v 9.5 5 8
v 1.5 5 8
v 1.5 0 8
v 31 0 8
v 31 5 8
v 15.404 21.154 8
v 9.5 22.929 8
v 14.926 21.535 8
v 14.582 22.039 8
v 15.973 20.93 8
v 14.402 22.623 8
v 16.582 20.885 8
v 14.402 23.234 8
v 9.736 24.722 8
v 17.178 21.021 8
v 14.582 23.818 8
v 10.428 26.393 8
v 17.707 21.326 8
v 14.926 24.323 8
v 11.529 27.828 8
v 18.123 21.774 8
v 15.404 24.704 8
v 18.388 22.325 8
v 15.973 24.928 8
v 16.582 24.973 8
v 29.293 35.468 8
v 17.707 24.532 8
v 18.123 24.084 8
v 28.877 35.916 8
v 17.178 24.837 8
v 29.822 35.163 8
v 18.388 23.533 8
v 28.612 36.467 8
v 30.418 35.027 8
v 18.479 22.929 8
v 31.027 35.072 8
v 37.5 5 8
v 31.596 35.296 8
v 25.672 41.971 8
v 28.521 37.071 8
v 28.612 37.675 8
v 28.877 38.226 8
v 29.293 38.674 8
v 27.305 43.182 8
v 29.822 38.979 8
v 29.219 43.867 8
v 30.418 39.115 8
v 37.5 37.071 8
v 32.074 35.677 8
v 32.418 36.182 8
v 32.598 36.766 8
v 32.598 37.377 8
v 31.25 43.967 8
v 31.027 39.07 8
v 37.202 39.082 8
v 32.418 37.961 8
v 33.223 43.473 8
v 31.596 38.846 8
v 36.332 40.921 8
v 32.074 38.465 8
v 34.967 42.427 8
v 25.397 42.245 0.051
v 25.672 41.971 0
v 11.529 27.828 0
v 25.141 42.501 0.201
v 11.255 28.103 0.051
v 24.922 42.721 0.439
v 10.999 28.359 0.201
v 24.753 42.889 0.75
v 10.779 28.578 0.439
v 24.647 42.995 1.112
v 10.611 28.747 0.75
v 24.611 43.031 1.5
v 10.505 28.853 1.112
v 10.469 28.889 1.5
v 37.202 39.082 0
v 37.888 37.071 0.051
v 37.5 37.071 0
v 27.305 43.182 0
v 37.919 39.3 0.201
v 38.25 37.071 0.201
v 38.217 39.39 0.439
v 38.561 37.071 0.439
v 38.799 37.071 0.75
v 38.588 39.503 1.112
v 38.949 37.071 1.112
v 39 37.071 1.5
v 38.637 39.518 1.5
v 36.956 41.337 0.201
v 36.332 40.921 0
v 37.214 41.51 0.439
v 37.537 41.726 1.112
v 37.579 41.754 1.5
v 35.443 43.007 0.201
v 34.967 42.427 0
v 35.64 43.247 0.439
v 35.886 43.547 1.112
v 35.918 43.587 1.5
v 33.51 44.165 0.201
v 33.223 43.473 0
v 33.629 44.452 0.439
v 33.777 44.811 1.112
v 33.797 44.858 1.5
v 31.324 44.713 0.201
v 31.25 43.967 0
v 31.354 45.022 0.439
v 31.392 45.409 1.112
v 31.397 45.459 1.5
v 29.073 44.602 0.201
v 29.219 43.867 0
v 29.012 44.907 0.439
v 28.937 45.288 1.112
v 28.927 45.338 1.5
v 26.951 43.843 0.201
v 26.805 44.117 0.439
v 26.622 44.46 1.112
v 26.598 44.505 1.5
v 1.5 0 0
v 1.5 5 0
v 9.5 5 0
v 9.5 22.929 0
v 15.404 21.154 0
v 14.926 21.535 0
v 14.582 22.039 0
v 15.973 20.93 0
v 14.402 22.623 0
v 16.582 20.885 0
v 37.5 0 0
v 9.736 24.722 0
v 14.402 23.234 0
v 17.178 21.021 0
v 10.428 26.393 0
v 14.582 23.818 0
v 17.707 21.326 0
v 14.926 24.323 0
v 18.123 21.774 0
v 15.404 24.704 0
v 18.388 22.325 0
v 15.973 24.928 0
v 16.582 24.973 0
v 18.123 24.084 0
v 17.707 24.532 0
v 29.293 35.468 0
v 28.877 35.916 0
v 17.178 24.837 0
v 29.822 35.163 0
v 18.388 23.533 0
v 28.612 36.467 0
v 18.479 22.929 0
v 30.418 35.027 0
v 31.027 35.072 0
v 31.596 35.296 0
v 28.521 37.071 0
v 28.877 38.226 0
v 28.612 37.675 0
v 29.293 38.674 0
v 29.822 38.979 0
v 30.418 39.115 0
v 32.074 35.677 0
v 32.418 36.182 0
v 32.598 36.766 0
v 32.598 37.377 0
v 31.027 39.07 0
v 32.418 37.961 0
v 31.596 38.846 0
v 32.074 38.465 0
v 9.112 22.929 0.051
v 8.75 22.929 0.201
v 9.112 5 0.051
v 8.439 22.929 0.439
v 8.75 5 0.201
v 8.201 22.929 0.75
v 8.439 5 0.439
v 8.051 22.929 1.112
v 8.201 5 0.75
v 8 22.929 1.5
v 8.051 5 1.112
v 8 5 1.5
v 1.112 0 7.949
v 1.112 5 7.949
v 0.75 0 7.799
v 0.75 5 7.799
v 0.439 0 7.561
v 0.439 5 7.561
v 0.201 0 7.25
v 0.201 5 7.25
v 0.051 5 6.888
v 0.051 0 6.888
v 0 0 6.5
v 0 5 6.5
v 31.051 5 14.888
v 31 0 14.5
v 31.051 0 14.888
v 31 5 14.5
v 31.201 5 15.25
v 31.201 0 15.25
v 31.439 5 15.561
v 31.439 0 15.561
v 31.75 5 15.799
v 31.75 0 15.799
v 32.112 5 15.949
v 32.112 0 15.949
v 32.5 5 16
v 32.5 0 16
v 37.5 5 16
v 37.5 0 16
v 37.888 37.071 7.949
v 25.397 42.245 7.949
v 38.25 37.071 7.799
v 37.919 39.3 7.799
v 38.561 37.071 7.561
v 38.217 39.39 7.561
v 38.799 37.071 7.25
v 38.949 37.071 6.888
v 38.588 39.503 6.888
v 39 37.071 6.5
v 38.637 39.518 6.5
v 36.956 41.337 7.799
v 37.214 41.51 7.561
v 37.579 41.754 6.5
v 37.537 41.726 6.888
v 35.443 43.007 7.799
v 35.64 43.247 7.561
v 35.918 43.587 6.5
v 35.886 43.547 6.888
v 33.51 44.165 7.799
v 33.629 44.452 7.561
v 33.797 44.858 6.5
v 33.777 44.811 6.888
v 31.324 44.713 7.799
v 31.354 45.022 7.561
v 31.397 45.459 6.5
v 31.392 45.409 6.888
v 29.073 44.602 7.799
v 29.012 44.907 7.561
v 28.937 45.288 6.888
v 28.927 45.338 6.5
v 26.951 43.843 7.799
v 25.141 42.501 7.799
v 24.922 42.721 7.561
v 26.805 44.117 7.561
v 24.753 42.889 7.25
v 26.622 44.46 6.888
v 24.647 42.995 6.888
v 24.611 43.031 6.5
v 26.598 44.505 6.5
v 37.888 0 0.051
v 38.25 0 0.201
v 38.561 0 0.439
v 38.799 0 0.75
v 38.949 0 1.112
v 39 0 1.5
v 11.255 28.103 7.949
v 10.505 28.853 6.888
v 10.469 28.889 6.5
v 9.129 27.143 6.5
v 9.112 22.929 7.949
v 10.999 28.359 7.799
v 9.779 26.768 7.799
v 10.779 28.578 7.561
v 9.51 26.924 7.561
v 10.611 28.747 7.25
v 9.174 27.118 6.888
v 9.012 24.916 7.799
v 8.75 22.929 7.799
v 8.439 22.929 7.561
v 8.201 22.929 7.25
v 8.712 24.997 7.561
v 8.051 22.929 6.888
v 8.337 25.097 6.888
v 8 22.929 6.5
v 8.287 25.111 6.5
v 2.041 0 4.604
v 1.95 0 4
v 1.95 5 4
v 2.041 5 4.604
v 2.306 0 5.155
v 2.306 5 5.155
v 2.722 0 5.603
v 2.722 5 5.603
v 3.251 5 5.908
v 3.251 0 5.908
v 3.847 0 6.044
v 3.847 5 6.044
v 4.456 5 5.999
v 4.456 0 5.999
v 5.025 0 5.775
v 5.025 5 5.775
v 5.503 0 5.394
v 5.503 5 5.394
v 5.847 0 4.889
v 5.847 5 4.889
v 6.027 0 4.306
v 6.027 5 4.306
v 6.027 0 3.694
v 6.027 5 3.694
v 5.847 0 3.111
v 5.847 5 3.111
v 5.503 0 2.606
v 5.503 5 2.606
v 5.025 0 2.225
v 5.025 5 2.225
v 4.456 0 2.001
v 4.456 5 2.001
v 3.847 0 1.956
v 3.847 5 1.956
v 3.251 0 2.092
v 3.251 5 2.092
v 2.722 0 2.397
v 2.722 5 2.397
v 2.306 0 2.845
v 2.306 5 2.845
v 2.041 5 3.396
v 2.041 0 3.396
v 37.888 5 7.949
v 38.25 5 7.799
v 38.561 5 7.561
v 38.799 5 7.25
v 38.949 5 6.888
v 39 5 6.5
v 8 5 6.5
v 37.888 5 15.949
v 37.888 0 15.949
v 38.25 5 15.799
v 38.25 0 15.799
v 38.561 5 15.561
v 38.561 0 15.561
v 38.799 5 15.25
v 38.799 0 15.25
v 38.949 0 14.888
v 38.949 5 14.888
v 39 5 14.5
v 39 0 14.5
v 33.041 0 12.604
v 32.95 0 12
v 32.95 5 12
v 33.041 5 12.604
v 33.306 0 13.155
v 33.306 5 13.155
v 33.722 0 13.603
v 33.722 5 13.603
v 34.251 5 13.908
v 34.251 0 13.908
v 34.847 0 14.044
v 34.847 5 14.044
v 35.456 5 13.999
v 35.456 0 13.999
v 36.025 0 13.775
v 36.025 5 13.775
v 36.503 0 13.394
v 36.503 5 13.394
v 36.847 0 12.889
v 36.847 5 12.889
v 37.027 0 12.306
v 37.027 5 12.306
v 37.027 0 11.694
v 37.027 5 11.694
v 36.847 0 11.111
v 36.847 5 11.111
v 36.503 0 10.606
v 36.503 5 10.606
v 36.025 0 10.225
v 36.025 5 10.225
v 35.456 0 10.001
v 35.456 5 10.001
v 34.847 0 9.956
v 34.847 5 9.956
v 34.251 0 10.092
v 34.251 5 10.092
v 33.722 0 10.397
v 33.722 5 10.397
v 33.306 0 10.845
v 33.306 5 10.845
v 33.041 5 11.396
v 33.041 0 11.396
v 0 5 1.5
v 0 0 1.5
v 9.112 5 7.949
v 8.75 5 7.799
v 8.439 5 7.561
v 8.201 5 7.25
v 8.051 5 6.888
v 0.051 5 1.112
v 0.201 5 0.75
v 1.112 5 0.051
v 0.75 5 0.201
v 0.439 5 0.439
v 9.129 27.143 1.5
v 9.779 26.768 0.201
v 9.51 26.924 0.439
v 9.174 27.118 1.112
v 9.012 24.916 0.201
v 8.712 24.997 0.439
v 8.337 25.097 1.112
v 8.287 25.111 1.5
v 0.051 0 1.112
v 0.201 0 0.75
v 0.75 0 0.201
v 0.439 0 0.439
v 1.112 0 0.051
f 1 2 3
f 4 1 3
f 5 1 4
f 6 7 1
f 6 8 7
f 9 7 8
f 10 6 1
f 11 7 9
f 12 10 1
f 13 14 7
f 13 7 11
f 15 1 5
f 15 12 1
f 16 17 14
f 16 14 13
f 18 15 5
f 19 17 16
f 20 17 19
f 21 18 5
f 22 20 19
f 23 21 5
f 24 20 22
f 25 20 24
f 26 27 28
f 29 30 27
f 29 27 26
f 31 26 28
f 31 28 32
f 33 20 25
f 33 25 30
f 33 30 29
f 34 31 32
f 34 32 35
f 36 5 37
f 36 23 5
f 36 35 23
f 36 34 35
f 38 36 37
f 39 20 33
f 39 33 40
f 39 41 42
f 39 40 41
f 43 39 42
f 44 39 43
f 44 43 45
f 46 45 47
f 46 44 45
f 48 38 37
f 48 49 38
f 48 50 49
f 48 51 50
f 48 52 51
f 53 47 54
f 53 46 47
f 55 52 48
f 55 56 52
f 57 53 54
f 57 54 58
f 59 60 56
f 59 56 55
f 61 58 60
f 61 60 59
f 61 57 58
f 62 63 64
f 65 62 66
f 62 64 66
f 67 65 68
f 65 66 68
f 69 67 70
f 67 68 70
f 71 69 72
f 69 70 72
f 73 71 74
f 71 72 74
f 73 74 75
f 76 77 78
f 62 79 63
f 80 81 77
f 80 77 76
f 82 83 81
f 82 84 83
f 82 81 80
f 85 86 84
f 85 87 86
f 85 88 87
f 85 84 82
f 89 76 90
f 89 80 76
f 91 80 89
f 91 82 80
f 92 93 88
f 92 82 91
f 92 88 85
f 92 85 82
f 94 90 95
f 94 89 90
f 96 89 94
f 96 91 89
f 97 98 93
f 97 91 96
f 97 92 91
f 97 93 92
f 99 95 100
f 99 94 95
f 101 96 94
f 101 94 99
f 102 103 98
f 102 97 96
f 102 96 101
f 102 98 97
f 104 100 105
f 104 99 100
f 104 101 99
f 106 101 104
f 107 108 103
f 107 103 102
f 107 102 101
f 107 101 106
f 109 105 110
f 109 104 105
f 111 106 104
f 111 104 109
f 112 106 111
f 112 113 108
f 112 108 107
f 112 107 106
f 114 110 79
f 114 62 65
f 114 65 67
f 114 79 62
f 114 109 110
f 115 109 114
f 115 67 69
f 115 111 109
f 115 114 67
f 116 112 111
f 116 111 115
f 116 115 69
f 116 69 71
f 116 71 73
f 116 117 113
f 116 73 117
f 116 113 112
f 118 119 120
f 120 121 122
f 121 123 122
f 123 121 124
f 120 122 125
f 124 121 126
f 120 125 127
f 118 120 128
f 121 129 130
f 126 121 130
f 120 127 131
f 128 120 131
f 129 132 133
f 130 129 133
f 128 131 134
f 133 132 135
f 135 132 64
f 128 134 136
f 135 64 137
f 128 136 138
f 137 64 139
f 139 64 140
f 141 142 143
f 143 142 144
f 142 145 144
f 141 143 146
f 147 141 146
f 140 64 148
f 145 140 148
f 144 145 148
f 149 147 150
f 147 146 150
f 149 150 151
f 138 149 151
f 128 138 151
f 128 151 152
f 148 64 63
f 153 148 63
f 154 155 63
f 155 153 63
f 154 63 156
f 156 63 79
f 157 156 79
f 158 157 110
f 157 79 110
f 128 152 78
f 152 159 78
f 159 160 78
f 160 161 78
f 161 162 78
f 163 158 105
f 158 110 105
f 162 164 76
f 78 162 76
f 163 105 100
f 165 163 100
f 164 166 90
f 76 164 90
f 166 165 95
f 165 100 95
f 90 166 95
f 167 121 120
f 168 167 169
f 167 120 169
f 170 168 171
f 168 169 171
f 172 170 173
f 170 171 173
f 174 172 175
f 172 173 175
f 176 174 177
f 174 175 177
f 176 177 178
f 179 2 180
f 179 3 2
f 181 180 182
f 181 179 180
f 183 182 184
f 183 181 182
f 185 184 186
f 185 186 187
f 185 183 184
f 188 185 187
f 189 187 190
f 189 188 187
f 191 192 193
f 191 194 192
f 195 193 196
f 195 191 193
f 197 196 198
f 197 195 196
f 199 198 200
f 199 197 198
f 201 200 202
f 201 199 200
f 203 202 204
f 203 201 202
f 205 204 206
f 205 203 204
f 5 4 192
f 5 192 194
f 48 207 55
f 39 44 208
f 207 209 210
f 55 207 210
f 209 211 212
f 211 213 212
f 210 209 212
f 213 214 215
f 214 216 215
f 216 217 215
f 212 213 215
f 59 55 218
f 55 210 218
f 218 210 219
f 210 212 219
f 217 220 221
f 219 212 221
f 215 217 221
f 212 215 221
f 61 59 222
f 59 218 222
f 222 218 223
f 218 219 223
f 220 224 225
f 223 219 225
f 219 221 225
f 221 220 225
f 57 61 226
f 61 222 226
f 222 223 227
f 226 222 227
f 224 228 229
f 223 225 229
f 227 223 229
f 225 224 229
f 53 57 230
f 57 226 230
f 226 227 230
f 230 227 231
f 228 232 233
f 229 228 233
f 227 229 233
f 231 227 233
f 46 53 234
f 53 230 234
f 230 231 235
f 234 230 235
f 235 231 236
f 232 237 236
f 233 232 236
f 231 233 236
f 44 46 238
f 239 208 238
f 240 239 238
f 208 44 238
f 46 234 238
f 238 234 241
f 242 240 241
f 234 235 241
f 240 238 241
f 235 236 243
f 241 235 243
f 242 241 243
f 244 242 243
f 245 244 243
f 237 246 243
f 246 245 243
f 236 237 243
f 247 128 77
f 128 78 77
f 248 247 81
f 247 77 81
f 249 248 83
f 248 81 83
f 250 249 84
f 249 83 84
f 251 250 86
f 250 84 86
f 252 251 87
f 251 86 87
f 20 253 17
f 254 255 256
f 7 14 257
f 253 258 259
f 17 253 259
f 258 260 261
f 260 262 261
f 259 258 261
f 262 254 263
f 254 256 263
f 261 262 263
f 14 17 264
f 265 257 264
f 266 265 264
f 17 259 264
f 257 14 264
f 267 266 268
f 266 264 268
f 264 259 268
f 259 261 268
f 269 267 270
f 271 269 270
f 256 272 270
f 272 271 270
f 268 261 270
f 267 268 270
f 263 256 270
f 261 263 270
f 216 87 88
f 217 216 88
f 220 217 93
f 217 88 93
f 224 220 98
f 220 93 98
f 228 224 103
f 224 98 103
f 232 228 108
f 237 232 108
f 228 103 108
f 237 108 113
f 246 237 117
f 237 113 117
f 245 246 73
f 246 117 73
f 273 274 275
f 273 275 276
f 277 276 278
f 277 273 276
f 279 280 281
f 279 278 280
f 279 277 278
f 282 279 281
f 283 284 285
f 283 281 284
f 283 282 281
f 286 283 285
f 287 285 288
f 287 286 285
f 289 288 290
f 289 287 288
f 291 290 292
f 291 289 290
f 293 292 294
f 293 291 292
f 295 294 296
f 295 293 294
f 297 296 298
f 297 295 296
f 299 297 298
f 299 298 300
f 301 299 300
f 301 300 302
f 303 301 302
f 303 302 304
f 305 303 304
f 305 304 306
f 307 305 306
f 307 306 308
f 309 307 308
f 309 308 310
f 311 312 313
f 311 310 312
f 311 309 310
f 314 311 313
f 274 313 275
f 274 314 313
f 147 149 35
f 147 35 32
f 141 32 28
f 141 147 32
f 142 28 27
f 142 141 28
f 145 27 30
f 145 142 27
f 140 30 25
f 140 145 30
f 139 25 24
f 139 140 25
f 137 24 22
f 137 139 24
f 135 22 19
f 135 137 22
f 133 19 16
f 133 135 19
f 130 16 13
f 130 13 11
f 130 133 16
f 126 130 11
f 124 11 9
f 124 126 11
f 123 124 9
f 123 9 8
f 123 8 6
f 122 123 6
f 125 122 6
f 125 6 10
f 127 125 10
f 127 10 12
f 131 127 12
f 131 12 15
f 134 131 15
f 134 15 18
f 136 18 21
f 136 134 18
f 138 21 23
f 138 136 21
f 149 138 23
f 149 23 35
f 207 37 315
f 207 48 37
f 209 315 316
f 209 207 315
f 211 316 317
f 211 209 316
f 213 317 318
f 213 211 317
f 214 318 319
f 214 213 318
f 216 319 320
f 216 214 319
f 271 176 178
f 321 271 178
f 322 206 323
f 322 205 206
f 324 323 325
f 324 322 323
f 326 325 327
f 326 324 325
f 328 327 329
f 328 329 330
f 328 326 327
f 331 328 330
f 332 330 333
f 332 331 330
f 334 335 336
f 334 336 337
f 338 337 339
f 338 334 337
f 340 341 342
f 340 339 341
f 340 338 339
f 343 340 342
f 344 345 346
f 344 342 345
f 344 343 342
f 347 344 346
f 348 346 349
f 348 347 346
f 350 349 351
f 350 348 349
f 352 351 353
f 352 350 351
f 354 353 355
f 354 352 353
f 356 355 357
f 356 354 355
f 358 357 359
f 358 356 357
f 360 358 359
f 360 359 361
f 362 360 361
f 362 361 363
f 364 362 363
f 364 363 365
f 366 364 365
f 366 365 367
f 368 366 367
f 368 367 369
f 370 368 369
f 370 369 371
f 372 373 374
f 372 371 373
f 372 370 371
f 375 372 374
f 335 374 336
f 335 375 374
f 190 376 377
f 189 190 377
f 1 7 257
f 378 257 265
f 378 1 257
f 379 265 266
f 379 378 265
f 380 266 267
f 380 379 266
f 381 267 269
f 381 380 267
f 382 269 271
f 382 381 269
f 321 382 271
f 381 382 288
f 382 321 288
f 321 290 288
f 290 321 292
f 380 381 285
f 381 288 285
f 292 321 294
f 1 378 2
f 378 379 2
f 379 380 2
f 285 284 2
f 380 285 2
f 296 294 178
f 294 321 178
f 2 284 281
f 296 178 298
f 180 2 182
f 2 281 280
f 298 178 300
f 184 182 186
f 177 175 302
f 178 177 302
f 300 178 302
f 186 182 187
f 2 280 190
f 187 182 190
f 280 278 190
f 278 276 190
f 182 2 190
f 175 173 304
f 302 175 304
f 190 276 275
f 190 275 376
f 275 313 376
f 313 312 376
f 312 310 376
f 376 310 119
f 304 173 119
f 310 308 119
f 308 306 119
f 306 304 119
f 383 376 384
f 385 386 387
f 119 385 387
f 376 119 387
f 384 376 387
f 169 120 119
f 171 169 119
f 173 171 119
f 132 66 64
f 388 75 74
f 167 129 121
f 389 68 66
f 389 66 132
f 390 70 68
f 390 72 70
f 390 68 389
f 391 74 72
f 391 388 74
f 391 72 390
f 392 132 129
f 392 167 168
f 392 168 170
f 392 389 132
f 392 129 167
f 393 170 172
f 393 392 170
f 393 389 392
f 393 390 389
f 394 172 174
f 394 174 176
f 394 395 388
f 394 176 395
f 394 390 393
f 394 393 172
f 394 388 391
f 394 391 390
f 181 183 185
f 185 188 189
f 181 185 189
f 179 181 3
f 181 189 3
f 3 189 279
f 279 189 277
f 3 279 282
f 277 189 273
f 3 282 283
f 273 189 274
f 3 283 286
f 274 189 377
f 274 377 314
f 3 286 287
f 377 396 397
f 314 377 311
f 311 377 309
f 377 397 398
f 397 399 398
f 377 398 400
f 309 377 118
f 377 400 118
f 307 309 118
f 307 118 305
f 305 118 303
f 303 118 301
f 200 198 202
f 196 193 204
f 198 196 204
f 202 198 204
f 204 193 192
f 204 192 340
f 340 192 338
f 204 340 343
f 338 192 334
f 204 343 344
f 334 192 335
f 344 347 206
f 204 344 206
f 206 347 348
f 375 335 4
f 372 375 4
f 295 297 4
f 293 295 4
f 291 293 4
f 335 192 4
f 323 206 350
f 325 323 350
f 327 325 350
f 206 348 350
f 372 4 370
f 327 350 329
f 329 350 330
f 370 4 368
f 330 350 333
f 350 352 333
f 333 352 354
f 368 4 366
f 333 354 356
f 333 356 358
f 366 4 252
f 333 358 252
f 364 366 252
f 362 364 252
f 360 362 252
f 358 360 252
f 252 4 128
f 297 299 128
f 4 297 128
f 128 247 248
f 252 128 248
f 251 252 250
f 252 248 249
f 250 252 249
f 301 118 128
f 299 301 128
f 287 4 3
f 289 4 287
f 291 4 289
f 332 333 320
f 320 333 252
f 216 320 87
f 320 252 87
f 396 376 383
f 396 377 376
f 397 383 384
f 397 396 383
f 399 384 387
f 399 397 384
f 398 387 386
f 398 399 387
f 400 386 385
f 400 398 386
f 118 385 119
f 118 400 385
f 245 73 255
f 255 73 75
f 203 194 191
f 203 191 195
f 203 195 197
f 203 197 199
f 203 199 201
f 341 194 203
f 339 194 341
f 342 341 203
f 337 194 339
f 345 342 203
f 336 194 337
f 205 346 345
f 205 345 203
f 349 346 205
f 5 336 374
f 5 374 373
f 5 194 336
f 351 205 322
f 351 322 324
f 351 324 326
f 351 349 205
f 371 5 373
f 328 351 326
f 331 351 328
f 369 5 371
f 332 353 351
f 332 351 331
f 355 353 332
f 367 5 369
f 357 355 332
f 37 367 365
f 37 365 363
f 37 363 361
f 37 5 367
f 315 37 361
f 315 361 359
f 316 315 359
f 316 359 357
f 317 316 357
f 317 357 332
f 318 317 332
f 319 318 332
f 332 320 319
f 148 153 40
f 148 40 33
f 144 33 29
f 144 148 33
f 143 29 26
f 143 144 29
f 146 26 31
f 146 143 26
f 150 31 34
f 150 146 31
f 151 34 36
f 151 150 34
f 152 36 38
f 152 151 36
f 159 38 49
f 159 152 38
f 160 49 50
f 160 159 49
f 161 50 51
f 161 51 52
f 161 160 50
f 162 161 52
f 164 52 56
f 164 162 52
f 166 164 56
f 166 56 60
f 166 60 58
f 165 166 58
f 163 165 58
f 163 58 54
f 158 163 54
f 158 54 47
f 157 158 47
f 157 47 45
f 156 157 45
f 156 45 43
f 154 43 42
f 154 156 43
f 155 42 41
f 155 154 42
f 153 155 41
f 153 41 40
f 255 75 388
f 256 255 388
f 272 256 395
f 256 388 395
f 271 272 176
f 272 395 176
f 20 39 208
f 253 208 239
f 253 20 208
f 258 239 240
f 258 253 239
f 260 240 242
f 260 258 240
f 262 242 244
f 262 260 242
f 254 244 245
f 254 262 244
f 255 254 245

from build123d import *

# Parameters (mm, degrees)
ESQUISSE7_R                  = 2.05
BOSS_EXTRU_1_DEPTH           = 8
ESQUISSE8_W                  = 8
ESQUISSE8_H                  = 5
BOSS_EXTRU_2_DEPTH           = 8
ENL_V_MAT_EXTRU_3_DEPTH      = 59.457249337
ENL_V_MAT_EXTRU_3_DEPTH_BACK = 59.457249337
ESQUISSE9_R                  = 2.05
CONG_5_R                     = 1.5


with BuildPart() as part:
    # Esquisse7 → Boss.-Extru.1 (new body)
    with BuildSketch(Plane.XY):
        with BuildLine():
            Line((0, 0), (39, 0))
            Line((39, 0), (39, 37.071067812))
            ThreePointArc((39, 37.071067812), (33.796680513, 44.858385741), (24.610912703, 43.03122292))
            Line((24.610912703, 43.03122292), (10.46877708, 28.889087297))
            ThreePointArc((10.46877708, 28.889087297), (8.641614259, 26.154544889), (8, 22.928932188))
            Line((8, 22.928932188), (8, 5))
            Line((8, 5), (0, 5))
            Line((0, 5), (0, 0))
        make_face()
        with Locations((16.428932188, 22.928932188)):
            Circle(ESQUISSE7_R, mode=Mode.SUBTRACT)
        with Locations(Location((30.571067812, 37.071067812, 0), (0, 0, 180))):
            Circle(ESQUISSE7_R, mode=Mode.SUBTRACT)
    extrude(amount=BOSS_EXTRU_1_DEPTH)

    # Esquisse8 → Boss.-Extru.2 (add)
    with BuildSketch(Plane.XY.offset(8)):
        with Locations((35, 2.5)):
            Rectangle(ESQUISSE8_W, ESQUISSE8_H)
    extrude(amount=BOSS_EXTRU_2_DEPTH)

    # Esquisse9 → Enlèv. mat.-Extru.3 (cut, two sides: drawn at the far end of the back side and taken through both)
    with BuildSketch(Plane(origin=(0, 5, 0), x_dir=(1, 0, 0), z_dir=(0, 1, 0)).offset(-ENL_V_MAT_EXTRU_3_DEPTH_BACK)):
        with Locations(Location((35, -12, 0), (0, 0, 180))):
            Circle(ESQUISSE9_R)
        with Locations(Location((4, -4, 0), (0, 0, 180))):
            Circle(ESQUISSE9_R)
    extrude(amount=ENL_V_MAT_EXTRU_3_DEPTH + ENL_V_MAT_EXTRU_3_DEPTH_BACK, mode=Mode.SUBTRACT)

    # Congé5
    cong_5_edges = [part.edges().sort_by_distance(p)[0] for p in [
        (33.796680513, 44.858385741, 0),
        (39, 18.535533906, 0),
        (0, 2.5, 0),
        (33.796680513, 44.858385741, 8),
        (17.539844892, 35.960155108, 8),
        (8.641614259, 26.154544889, 8),
        (8, 13.964466094, 8),
        (39, 21.035533906, 8),
        (31, 2.5, 16),
        (39, 2.5, 16),
        (0, 2.5, 8),
        (8, 13.964466094, 0),
        (8.641614259, 26.154544889, 0),
        (17.539844892, 35.960155108, 0),
    ]]
    fillet(cong_5_edges, radius=CONG_5_R)


solid = part.part
